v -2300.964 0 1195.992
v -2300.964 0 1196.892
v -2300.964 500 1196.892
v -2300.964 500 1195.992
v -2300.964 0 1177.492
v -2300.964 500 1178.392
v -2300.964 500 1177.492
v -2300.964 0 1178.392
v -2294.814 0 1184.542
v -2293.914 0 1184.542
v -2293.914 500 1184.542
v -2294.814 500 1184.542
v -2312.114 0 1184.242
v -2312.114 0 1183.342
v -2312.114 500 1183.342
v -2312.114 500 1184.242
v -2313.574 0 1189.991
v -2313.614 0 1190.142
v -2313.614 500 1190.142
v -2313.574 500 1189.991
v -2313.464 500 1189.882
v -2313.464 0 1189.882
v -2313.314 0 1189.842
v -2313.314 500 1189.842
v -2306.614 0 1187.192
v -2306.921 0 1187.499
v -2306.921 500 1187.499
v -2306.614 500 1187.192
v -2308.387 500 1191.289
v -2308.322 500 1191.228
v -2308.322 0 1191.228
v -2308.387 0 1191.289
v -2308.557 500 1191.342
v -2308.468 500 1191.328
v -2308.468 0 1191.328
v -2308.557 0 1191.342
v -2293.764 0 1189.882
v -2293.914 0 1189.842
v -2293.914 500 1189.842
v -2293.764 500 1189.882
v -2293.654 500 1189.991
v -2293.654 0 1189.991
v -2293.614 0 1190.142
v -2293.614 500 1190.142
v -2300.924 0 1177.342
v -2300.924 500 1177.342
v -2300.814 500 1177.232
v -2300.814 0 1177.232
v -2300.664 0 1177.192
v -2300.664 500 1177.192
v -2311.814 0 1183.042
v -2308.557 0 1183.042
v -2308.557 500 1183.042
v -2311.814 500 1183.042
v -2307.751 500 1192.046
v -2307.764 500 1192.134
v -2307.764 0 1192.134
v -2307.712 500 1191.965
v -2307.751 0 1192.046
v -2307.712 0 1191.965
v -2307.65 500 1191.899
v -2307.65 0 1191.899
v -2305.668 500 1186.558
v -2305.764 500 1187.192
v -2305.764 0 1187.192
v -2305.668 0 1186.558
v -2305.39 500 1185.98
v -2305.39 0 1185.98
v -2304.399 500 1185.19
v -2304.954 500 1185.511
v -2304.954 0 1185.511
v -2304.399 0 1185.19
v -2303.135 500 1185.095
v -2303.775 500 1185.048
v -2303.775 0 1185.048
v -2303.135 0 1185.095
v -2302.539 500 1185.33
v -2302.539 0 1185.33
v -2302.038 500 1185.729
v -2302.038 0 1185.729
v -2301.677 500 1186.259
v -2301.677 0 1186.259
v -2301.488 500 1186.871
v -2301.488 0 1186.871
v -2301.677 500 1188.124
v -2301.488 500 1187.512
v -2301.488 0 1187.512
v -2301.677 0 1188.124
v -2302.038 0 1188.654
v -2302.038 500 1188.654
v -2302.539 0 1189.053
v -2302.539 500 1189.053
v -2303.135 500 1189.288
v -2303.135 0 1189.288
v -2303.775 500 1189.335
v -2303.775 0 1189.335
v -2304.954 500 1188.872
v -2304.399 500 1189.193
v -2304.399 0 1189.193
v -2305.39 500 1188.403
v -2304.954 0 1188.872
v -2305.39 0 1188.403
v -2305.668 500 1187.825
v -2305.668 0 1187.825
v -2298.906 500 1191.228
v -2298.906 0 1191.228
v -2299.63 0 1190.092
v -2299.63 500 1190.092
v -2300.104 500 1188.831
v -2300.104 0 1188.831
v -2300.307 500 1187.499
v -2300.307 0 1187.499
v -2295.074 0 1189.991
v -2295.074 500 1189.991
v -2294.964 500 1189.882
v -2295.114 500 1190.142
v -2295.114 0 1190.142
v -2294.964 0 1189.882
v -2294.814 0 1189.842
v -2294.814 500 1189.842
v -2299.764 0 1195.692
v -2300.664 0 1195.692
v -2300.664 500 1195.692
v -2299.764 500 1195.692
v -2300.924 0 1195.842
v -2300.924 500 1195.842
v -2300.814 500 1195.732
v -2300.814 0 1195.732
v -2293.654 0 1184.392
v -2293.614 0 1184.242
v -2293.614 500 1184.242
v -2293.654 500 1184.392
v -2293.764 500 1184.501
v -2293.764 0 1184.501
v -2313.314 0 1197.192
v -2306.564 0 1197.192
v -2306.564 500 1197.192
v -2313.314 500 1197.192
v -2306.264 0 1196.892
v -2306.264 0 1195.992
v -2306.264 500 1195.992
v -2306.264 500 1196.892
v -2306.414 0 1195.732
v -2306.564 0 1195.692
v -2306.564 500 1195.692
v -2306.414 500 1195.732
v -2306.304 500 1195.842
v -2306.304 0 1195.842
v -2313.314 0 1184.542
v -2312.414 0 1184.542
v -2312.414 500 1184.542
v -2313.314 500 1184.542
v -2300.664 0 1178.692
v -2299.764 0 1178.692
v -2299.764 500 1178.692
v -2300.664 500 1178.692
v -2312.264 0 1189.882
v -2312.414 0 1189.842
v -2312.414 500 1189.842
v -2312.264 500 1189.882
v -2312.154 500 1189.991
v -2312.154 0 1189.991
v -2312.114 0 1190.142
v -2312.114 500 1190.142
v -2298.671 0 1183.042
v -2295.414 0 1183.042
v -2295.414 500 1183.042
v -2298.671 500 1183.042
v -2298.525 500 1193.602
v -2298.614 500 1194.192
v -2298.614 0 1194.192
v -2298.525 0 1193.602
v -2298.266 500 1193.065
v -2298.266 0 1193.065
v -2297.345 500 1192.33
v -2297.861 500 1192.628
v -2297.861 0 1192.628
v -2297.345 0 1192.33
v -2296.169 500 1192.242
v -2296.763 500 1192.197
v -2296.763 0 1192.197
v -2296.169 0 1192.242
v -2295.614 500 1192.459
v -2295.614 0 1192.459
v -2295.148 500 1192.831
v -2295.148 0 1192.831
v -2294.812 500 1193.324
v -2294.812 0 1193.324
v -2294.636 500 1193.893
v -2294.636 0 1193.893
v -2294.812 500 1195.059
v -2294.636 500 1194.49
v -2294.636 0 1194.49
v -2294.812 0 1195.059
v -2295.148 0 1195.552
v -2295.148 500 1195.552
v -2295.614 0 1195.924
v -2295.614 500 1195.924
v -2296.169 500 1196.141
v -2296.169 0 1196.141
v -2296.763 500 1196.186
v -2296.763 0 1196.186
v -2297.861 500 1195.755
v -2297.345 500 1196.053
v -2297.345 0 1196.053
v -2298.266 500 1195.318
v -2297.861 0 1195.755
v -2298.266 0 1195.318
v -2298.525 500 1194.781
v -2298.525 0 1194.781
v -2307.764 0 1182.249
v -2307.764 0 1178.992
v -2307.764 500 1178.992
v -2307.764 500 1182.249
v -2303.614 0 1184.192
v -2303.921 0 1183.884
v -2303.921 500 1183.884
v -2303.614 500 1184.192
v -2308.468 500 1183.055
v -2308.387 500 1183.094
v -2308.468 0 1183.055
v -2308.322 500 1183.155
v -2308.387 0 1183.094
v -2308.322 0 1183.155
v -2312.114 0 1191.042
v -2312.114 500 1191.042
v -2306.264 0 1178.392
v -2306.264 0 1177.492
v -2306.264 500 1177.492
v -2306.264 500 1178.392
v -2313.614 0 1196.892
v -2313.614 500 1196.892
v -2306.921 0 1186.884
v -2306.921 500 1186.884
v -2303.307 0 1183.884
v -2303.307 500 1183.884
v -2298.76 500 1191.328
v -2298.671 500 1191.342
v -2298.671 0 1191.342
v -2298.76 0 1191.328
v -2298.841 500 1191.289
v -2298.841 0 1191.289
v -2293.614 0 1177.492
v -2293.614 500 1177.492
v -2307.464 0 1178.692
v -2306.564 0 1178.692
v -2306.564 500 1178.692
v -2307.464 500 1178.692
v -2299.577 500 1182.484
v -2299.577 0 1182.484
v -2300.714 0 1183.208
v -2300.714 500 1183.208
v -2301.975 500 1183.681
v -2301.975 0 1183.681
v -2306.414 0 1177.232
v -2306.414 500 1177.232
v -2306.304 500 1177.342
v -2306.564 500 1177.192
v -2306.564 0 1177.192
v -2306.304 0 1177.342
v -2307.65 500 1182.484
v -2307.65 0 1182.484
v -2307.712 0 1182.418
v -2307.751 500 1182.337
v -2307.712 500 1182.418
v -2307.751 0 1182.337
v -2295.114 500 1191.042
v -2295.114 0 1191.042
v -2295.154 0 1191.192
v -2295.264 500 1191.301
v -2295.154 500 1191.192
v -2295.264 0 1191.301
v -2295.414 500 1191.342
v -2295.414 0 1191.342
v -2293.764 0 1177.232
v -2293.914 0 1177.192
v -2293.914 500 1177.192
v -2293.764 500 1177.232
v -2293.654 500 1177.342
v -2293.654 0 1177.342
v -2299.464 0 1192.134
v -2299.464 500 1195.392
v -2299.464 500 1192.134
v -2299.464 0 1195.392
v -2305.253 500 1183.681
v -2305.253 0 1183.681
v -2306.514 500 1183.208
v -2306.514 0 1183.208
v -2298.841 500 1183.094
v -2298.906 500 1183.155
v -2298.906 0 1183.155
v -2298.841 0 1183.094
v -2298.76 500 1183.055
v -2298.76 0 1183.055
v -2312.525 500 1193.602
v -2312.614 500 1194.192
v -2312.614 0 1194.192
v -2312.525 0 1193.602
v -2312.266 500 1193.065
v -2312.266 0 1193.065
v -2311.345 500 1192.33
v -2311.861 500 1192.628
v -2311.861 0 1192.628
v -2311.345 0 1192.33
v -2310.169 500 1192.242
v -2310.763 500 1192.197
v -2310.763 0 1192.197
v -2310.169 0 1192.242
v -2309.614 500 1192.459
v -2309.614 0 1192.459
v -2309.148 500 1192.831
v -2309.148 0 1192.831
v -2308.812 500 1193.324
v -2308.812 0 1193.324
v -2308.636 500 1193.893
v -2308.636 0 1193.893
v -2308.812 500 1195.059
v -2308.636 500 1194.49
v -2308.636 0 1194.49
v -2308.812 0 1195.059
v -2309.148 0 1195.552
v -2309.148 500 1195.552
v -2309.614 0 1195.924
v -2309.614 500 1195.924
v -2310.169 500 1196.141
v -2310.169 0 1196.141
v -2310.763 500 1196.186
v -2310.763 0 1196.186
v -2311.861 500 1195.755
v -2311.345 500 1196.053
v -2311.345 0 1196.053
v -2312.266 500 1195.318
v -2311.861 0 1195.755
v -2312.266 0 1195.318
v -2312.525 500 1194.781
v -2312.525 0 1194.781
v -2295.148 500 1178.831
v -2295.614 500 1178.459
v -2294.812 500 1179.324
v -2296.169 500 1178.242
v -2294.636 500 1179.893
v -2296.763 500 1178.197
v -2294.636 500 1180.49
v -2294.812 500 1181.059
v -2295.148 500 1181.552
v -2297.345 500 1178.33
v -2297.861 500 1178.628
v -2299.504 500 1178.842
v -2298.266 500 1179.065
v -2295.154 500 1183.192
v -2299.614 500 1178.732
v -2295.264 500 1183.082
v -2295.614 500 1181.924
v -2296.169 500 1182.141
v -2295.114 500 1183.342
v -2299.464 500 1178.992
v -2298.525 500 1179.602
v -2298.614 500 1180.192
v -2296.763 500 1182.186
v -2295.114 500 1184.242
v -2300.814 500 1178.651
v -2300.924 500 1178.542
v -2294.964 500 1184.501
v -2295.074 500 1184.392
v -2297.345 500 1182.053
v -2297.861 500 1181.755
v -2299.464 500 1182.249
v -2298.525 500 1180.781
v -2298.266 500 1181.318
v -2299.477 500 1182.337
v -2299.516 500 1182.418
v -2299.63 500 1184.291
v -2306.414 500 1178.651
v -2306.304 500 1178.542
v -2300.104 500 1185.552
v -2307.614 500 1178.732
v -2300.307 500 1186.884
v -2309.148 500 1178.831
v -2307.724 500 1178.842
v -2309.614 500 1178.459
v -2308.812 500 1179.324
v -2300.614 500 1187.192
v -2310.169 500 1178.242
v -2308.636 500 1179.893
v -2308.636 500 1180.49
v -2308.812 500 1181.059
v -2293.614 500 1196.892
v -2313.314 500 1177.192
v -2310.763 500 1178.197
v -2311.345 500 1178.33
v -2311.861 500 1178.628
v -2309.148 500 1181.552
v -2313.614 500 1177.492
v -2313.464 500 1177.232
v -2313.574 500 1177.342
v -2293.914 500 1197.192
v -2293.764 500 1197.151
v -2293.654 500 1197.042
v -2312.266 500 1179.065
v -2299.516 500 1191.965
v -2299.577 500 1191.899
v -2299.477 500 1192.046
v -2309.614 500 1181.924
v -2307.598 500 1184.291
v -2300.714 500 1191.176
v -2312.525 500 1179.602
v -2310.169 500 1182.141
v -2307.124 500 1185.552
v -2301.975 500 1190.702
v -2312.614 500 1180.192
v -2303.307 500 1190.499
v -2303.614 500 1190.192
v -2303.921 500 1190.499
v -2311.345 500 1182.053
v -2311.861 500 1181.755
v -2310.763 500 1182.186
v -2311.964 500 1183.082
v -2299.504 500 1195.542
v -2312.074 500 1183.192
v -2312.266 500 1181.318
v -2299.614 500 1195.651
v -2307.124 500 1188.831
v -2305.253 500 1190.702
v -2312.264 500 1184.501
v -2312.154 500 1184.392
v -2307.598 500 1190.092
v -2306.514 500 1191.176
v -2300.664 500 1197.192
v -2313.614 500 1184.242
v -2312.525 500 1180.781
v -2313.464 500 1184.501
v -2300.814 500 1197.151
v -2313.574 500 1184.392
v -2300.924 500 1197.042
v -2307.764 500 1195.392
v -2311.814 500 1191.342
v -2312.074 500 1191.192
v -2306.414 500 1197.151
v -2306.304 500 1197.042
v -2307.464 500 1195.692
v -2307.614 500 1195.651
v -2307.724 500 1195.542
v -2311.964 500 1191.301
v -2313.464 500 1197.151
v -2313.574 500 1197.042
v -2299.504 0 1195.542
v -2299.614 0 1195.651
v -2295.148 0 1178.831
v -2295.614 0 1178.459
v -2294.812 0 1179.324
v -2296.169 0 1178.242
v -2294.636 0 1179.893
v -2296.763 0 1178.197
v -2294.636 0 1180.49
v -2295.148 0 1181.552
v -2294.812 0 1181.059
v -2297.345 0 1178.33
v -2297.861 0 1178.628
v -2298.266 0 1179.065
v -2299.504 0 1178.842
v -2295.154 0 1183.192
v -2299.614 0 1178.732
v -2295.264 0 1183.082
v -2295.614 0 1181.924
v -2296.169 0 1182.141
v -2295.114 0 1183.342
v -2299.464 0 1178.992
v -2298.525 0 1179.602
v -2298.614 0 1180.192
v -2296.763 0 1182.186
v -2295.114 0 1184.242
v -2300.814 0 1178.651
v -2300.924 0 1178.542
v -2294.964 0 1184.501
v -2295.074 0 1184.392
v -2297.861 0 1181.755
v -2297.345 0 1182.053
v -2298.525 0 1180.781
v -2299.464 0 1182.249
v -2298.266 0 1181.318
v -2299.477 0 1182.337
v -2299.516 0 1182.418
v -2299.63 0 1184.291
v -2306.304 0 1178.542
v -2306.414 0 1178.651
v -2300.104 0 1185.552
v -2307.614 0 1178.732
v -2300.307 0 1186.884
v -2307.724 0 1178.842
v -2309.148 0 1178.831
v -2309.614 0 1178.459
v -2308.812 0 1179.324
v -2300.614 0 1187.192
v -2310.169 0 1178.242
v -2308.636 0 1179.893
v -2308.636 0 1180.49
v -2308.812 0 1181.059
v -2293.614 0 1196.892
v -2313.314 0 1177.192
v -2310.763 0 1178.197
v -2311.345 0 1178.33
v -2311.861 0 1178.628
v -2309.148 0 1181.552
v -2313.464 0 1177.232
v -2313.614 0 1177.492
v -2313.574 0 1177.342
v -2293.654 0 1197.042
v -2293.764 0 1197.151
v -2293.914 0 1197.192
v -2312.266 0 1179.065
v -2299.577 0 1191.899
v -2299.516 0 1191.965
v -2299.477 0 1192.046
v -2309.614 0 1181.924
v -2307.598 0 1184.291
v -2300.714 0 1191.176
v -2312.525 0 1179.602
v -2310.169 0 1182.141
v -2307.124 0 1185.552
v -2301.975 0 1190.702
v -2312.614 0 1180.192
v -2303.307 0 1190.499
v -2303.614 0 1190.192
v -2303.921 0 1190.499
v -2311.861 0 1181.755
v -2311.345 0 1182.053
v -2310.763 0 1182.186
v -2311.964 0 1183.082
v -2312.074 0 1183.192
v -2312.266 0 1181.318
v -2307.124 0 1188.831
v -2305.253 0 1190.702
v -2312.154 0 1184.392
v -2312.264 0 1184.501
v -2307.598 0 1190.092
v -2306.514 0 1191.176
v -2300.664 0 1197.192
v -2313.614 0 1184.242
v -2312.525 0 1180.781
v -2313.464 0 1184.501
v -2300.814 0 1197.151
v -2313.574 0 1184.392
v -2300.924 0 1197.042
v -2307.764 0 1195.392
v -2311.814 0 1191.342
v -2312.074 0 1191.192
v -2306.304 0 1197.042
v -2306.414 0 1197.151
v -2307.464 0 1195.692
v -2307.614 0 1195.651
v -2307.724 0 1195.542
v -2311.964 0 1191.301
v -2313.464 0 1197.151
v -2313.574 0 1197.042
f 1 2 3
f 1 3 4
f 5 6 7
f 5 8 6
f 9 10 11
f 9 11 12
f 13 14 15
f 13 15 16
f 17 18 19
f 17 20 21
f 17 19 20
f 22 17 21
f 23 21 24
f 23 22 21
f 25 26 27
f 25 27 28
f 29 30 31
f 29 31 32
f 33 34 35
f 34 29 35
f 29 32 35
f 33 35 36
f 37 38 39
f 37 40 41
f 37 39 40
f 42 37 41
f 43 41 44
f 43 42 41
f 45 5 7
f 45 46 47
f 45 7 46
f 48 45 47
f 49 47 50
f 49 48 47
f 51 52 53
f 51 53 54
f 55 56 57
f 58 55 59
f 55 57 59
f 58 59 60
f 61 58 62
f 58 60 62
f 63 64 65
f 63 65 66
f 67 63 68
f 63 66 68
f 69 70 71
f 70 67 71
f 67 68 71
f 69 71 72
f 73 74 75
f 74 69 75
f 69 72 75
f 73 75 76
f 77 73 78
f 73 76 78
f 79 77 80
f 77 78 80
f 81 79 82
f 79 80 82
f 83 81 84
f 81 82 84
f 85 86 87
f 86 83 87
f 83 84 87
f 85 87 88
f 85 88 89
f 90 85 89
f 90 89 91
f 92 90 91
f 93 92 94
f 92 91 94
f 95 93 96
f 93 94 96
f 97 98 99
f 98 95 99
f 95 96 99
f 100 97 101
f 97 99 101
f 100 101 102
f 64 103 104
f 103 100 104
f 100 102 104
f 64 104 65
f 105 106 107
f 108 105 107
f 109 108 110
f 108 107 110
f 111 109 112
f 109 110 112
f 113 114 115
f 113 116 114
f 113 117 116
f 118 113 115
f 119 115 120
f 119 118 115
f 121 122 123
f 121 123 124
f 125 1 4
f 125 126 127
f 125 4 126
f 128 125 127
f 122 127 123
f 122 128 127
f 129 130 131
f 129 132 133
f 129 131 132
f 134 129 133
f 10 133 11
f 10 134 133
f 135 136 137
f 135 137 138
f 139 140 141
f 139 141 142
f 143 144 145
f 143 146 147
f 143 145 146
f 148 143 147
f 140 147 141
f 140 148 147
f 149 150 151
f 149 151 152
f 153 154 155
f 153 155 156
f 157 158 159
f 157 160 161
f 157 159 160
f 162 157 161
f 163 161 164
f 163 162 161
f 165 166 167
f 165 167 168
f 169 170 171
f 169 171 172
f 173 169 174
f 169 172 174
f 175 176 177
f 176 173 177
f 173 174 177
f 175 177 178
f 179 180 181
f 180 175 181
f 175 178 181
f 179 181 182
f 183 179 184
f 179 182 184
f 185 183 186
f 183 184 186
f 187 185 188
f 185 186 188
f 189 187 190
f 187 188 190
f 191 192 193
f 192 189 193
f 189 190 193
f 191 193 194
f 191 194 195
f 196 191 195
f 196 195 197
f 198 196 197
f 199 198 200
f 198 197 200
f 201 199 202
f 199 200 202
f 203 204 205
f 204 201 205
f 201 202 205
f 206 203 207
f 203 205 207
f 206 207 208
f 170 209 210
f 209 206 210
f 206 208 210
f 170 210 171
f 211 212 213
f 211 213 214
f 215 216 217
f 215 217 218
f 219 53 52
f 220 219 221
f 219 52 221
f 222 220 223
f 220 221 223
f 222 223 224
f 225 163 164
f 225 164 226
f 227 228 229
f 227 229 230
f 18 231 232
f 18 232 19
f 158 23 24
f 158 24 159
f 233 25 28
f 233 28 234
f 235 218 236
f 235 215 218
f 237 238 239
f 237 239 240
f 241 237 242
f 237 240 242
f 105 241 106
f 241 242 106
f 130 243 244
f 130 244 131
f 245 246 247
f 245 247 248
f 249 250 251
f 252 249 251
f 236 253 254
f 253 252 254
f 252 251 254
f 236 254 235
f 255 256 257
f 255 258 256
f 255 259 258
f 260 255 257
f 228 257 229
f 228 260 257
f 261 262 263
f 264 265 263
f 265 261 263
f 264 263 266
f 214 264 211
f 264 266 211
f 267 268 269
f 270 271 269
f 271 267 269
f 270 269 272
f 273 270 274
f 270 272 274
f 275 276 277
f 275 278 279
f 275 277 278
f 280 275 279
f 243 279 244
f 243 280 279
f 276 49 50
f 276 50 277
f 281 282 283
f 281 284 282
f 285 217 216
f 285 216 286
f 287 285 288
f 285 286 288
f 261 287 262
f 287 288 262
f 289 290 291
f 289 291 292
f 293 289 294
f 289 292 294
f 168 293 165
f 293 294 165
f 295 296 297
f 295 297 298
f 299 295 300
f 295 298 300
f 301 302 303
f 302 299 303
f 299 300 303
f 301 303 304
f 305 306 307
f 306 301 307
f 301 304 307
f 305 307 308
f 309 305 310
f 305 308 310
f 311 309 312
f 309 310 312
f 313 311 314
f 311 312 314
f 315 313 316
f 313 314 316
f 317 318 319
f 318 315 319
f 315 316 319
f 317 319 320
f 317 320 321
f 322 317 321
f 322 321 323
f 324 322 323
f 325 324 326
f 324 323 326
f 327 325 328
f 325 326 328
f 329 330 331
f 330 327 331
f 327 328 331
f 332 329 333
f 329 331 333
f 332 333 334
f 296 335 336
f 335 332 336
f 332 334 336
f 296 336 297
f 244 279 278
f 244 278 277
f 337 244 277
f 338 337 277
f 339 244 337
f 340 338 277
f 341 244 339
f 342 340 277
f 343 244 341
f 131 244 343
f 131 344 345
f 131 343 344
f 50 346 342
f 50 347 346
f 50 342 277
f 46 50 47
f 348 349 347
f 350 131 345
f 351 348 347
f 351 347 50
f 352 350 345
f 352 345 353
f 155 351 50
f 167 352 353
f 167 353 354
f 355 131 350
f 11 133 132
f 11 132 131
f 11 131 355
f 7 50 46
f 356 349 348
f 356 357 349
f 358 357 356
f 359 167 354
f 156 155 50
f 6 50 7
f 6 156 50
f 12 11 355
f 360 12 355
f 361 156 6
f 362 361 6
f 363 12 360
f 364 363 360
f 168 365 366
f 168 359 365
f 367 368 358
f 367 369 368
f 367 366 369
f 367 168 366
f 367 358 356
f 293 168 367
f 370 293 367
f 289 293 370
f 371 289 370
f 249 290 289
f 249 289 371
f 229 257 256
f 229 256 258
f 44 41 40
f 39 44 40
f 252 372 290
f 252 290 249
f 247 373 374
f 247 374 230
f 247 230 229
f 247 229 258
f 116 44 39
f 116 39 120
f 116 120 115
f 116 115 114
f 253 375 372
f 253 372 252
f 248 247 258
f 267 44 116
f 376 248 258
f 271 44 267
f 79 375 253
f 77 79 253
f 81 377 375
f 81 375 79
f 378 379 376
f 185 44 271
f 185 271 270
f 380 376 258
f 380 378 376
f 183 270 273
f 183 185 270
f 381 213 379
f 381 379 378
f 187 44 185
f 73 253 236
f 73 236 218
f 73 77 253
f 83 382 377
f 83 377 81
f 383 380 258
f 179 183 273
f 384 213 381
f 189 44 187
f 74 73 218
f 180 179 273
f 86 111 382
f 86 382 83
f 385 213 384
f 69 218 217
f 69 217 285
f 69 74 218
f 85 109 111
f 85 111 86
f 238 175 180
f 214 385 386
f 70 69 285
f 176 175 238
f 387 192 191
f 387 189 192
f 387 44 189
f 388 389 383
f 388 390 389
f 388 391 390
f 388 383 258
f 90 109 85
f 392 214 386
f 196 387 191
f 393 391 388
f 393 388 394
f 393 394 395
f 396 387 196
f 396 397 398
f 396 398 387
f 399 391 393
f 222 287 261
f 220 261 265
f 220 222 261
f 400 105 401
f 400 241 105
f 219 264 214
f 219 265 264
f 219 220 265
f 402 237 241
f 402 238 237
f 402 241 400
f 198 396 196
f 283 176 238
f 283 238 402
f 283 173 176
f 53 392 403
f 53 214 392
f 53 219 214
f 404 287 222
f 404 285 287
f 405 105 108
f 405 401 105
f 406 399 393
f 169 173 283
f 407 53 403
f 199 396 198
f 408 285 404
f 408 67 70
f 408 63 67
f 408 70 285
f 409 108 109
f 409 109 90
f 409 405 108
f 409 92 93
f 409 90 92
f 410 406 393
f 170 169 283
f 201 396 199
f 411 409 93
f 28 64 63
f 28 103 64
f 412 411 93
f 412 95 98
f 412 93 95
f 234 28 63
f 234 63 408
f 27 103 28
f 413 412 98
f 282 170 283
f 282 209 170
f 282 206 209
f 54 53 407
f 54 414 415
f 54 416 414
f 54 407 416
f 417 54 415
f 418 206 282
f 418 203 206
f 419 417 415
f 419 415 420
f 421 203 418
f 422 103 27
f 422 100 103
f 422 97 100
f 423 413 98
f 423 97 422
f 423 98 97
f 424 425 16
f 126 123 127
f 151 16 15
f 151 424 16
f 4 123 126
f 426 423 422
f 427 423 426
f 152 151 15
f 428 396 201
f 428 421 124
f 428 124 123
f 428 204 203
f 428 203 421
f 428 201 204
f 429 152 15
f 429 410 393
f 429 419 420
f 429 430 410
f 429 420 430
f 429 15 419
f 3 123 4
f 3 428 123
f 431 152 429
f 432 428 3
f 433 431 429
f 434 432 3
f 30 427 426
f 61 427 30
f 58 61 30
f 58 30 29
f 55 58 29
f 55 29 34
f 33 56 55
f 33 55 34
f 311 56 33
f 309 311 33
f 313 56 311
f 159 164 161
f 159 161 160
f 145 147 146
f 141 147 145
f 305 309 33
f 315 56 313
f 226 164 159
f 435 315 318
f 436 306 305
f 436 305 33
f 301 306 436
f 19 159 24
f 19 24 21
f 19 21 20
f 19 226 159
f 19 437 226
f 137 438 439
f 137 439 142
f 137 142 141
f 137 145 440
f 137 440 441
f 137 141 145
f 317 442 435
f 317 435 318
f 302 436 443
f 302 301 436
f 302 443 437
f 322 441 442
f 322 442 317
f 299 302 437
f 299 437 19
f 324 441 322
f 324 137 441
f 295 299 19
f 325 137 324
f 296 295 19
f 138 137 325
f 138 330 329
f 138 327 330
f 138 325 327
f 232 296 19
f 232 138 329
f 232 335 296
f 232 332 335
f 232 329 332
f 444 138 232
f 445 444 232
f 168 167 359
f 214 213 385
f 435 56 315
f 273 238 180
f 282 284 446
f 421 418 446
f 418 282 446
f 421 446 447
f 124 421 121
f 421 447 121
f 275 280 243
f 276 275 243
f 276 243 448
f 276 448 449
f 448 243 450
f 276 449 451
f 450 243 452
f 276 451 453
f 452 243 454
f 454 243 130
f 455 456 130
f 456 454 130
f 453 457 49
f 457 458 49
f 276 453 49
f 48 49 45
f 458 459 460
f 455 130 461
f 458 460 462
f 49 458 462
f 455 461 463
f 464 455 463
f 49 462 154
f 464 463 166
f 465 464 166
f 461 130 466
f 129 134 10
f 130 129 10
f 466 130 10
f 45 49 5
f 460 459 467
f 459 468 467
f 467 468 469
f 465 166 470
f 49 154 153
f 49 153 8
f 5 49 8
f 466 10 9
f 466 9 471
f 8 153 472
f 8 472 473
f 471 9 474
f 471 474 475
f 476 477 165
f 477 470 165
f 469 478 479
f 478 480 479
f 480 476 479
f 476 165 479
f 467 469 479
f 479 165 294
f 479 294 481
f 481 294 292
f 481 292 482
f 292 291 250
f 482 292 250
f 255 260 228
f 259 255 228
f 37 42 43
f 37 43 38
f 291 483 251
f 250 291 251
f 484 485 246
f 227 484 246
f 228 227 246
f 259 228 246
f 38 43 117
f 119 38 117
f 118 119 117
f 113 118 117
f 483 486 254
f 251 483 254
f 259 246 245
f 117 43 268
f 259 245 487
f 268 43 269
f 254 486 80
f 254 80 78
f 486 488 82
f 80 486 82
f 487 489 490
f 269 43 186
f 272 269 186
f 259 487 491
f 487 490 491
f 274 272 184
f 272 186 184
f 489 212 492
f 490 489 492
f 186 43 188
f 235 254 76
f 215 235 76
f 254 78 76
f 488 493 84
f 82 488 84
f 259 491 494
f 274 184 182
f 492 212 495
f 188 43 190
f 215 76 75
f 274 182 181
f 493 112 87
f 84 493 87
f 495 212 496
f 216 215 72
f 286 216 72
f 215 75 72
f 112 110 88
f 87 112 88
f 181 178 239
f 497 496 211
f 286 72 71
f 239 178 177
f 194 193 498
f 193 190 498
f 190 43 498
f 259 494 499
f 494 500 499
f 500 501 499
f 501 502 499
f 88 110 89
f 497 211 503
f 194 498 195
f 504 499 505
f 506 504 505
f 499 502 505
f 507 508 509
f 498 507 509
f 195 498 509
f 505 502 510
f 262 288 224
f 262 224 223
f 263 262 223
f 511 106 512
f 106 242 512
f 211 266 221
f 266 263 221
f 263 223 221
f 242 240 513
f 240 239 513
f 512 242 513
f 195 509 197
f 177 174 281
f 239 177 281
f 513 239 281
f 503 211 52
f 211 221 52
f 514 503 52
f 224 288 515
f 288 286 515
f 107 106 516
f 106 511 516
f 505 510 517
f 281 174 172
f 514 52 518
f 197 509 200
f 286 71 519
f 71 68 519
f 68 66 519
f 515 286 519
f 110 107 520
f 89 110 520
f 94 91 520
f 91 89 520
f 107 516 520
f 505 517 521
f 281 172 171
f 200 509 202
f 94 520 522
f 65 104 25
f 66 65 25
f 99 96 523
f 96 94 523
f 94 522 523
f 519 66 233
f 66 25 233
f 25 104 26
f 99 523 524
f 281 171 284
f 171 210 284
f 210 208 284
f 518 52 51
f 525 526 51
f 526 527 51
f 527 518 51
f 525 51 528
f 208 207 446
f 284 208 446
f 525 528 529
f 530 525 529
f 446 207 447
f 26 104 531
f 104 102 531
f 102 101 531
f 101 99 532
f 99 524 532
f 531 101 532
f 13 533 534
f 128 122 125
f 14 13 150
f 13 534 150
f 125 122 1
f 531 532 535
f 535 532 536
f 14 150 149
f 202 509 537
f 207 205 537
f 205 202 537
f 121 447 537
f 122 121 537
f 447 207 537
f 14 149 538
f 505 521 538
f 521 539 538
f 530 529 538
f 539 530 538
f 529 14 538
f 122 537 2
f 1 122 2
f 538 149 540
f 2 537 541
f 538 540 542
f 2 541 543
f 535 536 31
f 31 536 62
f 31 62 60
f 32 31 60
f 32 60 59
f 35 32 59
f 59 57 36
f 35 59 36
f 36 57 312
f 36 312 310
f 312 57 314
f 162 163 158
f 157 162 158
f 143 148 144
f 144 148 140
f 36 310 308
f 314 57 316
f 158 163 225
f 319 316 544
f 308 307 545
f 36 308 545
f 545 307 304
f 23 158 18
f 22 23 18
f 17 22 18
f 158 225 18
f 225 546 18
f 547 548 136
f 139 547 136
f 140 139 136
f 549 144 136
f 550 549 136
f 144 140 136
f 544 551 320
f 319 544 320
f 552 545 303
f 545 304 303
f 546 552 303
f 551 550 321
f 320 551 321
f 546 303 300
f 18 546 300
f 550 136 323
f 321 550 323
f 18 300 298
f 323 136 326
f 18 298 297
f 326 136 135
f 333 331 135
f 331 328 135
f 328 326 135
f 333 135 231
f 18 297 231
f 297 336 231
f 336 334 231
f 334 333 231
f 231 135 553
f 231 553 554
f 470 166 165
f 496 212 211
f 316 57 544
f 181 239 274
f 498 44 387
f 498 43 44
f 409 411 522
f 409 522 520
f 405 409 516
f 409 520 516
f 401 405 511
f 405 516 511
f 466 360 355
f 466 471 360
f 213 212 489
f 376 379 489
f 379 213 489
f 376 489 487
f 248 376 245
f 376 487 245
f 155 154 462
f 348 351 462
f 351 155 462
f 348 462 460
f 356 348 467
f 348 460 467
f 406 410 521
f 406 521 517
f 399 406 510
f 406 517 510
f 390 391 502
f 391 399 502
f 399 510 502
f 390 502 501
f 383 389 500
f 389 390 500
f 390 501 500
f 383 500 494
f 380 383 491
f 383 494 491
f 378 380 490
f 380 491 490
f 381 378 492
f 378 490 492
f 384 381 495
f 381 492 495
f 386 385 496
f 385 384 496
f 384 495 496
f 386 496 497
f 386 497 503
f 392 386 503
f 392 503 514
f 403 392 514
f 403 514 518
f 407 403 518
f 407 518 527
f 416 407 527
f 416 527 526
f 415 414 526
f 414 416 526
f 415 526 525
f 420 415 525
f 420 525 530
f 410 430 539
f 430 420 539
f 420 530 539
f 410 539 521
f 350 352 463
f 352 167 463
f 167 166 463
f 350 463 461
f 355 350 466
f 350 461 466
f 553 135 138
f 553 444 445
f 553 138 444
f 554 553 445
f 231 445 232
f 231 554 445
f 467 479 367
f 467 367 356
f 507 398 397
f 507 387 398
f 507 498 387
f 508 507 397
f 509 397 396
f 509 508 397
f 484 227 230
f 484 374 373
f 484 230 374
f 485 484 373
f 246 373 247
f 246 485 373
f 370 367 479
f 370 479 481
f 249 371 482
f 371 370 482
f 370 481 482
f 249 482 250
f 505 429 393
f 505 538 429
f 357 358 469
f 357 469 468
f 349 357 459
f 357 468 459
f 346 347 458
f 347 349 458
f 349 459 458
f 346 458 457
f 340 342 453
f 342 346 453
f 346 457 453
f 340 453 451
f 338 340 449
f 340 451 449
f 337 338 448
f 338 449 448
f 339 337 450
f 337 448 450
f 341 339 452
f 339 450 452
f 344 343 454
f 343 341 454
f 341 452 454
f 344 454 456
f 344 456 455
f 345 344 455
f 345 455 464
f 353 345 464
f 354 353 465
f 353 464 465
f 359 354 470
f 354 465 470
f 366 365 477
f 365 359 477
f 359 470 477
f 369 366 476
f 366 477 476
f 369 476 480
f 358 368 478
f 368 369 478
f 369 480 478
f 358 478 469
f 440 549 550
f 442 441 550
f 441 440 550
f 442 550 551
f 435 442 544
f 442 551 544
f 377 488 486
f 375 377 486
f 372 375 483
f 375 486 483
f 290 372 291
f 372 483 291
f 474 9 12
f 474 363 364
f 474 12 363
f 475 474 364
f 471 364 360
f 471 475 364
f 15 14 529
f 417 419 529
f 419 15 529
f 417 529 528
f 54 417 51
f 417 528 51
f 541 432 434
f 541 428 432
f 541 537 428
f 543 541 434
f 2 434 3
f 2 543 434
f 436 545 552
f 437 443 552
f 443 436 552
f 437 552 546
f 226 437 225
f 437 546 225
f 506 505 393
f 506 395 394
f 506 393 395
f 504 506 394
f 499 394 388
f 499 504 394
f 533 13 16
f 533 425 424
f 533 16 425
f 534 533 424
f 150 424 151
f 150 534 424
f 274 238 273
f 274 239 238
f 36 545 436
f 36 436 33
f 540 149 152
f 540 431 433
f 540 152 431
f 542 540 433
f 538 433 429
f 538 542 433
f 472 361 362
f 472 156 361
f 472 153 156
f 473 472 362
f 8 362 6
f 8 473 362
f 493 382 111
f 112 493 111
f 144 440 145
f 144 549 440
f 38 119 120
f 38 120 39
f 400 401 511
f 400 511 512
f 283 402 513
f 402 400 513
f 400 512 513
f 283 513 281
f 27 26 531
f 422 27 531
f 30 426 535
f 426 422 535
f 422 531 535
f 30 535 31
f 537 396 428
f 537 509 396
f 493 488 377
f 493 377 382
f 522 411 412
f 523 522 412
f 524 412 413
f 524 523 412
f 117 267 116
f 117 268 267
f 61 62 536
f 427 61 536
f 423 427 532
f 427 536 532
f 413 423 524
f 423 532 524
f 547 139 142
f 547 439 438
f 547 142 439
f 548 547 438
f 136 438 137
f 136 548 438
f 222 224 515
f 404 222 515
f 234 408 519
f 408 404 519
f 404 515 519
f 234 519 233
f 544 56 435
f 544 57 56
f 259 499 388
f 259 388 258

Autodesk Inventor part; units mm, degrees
ref_plane "YZ Plane" through (0, 0, 0) normal (1, 0, 0) x (0, 1, 0)
ref_plane "XZ Plane" through (0, 0, 0) normal (0, 1, 0) x (-1, 0, 0)
ref_plane "XY Plane" through (0, 0, 0) normal (0, 0, 1) x (1, 0, 0)
sketch "2020_Base" plane through (0, 0, 0) normal (0, 1, 0) x (-1, 0, 0)
  line L0 (2307.7639, 1192.1343) -> (2307.7639, 1195.3915) projected
  arc A0 (2307.7639, 1195.3915) -> (2307.4639, 1195.6915) centre (2307.4639, 1195.3915) ccw projected
  line L1 (2307.4639, 1195.6915) -> (2306.5639, 1195.6915) projected
  arc A1 (2306.2639, 1195.9915) -> (2306.5639, 1195.6915) centre (2306.5639, 1195.9915) ccw projected
  line L2 (2306.2639, 1195.9915) -> (2306.2639, 1196.8915) projected
  arc A2 (2306.5639, 1197.1915) -> (2306.2639, 1196.8915) centre (2306.5639, 1196.8915) ccw projected
  line L3 (2306.5639, 1197.1915) -> (2313.3139, 1197.1915) projected
  arc A3 (2313.6139, 1196.8915) -> (2313.3139, 1197.1915) centre (2313.3139, 1196.8915) ccw projected
  line L4 (2313.6139, 1196.8915) -> (2313.6139, 1190.1415) projected
  arc A4 (2313.3139, 1189.8415) -> (2313.6139, 1190.1415) centre (2313.3139, 1190.1415) ccw projected
  line L5 (2313.3139, 1189.8415) -> (2312.4139, 1189.8415) projected
  arc A5 (2312.1139, 1190.1415) -> (2312.4139, 1189.8415) centre (2312.4139, 1190.1415) ccw projected
  line L6 (2312.1139, 1190.1415) -> (2312.1139, 1191.0415) projected
  arc A6 (2312.1139, 1191.0415) -> (2311.8139, 1191.3415) centre (2311.8139, 1191.0415) ccw projected
  line L7 (2311.8139, 1191.3415) -> (2308.5567, 1191.3415) projected
  arc A7 (2308.5567, 1191.3415) -> (2308.3217, 1191.2281) centre (2308.5567, 1191.0415) ccw projected
  arc A8 (2308.3217, 1191.2281) -> (2306.9212, 1187.4988) centre (2313.4048, 1187.1915) ccw projected
  line L8 (2306.9212, 1187.4988) -> (2306.6139, 1187.1915) projected
  line L9 (2306.6139, 1187.1915) -> (2306.9212, 1186.8843) projected
  arc A9 (2306.9212, 1186.8843) -> (2308.3217, 1183.155) centre (2313.4048, 1187.1915) ccw projected
  arc A10 (2308.3217, 1183.155) -> (2308.5567, 1183.0415) centre (2308.5567, 1183.3415) ccw projected
  line L10 (2308.5567, 1183.0415) -> (2311.8139, 1183.0415) projected
  arc A11 (2311.8139, 1183.0415) -> (2312.1139, 1183.3415) centre (2311.8139, 1183.3415) ccw projected
  line L11 (2312.1139, 1183.3415) -> (2312.1139, 1184.2415) projected
  arc A12 (2312.4139, 1184.5415) -> (2312.1139, 1184.2415) centre (2312.4139, 1184.2415) ccw projected
  line L12 (2312.4139, 1184.5415) -> (2313.3139, 1184.5415) projected
  arc A13 (2313.6139, 1184.2415) -> (2313.3139, 1184.5415) centre (2313.3139, 1184.2415) ccw projected
  line L13 (2313.6139, 1184.2415) -> (2313.6139, 1177.4915) projected
  arc A14 (2313.3139, 1177.1915) -> (2313.6139, 1177.4915) centre (2313.3139, 1177.4915) ccw projected
  line L14 (2313.3139, 1177.1915) -> (2306.5639, 1177.1915) projected
  arc A15 (2306.2639, 1177.4915) -> (2306.5639, 1177.1915) centre (2306.5639, 1177.4915) ccw projected
  line L15 (2306.2639, 1177.4915) -> (2306.2639, 1178.3915) projected
  arc A16 (2306.5639, 1178.6915) -> (2306.2639, 1178.3915) centre (2306.5639, 1178.3915) ccw projected
  line L16 (2306.5639, 1178.6915) -> (2307.4639, 1178.6915) projected
  arc A17 (2307.4639, 1178.6915) -> (2307.7639, 1178.9915) centre (2307.4639, 1178.9915) ccw projected
  line L17 (2307.7639, 1178.9915) -> (2307.7639, 1182.2488) projected
  arc A18 (2307.7639, 1182.2488) -> (2307.6505, 1182.4837) centre (2307.4639, 1182.2488) ccw projected
  arc A19 (2307.6505, 1182.4837) -> (2303.9212, 1183.8843) centre (2303.6139, 1177.4007) ccw projected
  line L18 (2303.9212, 1183.8843) -> (2303.6139, 1184.1915) projected
  line L19 (2303.6139, 1184.1915) -> (2303.3066, 1183.8843) projected
  arc A20 (2303.3066, 1183.8843) -> (2299.5774, 1182.4837) centre (2303.6139, 1177.4007) ccw projected
  arc A21 (2299.5774, 1182.4837) -> (2299.4639, 1182.2488) centre (2299.7639, 1182.2488) ccw projected
  line L20 (2299.4639, 1182.2488) -> (2299.4639, 1178.9915) projected
  arc A22 (2299.4639, 1178.9915) -> (2299.7639, 1178.6915) centre (2299.7639, 1178.9915) ccw projected
  line L21 (2299.7639, 1178.6915) -> (2300.6639, 1178.6915) projected
  arc A23 (2300.9639, 1178.3915) -> (2300.6639, 1178.6915) centre (2300.6639, 1178.3915) ccw projected
  line L22 (2300.9639, 1178.3915) -> (2300.9639, 1177.4915) projected
  arc A24 (2300.6639, 1177.1915) -> (2300.9639, 1177.4915) centre (2300.6639, 1177.4915) ccw projected
  line L23 (2300.6639, 1177.1915) -> (2293.9139, 1177.1915) projected
  arc A25 (2293.6139, 1177.4915) -> (2293.9139, 1177.1915) centre (2293.9139, 1177.4915) ccw projected
  line L24 (2293.6139, 1177.4915) -> (2293.6139, 1184.2415) projected
  arc A26 (2293.9139, 1184.5415) -> (2293.6139, 1184.2415) centre (2293.9139, 1184.2415) ccw projected
  line L25 (2293.9139, 1184.5415) -> (2294.8139, 1184.5415) projected
  arc A27 (2295.1139, 1184.2415) -> (2294.8139, 1184.5415) centre (2294.8139, 1184.2415) ccw projected
  line L26 (2295.1139, 1184.2415) -> (2295.1139, 1183.3415) projected
  arc A28 (2295.1139, 1183.3415) -> (2295.4139, 1183.0415) centre (2295.4139, 1183.3415) ccw projected
  line L27 (2295.4139, 1183.0415) -> (2298.6712, 1183.0415) projected
  arc A29 (2298.6712, 1183.0415) -> (2298.9061, 1183.155) centre (2298.6712, 1183.3415) ccw projected
  arc A30 (2298.9061, 1183.155) -> (2300.3066, 1186.8843) centre (2293.8231, 1187.1915) ccw projected
  line L28 (2300.3066, 1186.8843) -> (2300.6139, 1187.1915) projected
  line L29 (2300.6139, 1187.1915) -> (2300.3066, 1187.4988) projected
  arc A31 (2300.3066, 1187.4988) -> (2298.9061, 1191.2281) centre (2293.8231, 1187.1915) ccw projected
  arc A32 (2298.9061, 1191.2281) -> (2298.6712, 1191.3415) centre (2298.6712, 1191.0415) ccw projected
  line L30 (2298.6712, 1191.3415) -> (2295.4139, 1191.3415) projected
  arc A33 (2295.4139, 1191.3415) -> (2295.1139, 1191.0415) centre (2295.4139, 1191.0415) ccw projected
  line L31 (2295.1139, 1191.0415) -> (2295.1139, 1190.1415) projected
  arc A34 (2294.8139, 1189.8415) -> (2295.1139, 1190.1415) centre (2294.8139, 1190.1415) ccw projected
  line L32 (2294.8139, 1189.8415) -> (2293.9139, 1189.8415) projected
  arc A35 (2293.6139, 1190.1415) -> (2293.9139, 1189.8415) centre (2293.9139, 1190.1415) ccw projected
  line L33 (2293.6139, 1190.1415) -> (2293.6139, 1196.8915) projected
  arc A36 (2293.9139, 1197.1915) -> (2293.6139, 1196.8915) centre (2293.9139, 1196.8915) ccw projected
  line L34 (2293.9139, 1197.1915) -> (2300.6639, 1197.1915) projected
  arc A37 (2300.9639, 1196.8915) -> (2300.6639, 1197.1915) centre (2300.6639, 1196.8915) ccw projected
  line L35 (2300.9639, 1196.8915) -> (2300.9639, 1195.9915) projected
  arc A38 (2300.6639, 1195.6915) -> (2300.9639, 1195.9915) centre (2300.6639, 1195.9915) ccw projected
  line L36 (2300.6639, 1195.6915) -> (2299.7639, 1195.6915) projected
  arc A39 (2299.7639, 1195.6915) -> (2299.4639, 1195.3915) centre (2299.7639, 1195.3915) ccw projected
  line L37 (2299.4639, 1195.3915) -> (2299.4639, 1192.1343) projected
  arc A40 (2299.4639, 1192.1343) -> (2299.5774, 1191.8994) centre (2299.7639, 1192.1343) ccw projected
  arc A41 (2299.5774, 1191.8994) -> (2303.3066, 1190.4988) centre (2303.6139, 1196.9824) ccw projected
  line L38 (2303.3066, 1190.4988) -> (2303.6139, 1190.1915) projected
  line L39 (2303.6139, 1190.1915) -> (2303.9212, 1190.4988) projected
  arc A42 (2303.9212, 1190.4988) -> (2307.6505, 1191.8994) centre (2303.6139, 1196.9824) ccw projected
  arc A43 (2307.6505, 1191.8994) -> (2307.7639, 1192.1343) centre (2307.4639, 1192.1343) ccw projected
  circle A44 centre (2310.6139, 1194.1915) radius 2 projected
  circle A45 centre (2303.6139, 1187.1915) radius 2.15 projected
  circle A46 centre (2296.6139, 1194.1915) radius 2 projected
  circle A47 centre (2296.6139, 1180.1915) radius 2 projected
  circle A48 centre (2310.6139, 1180.1915) radius 2 projected
  point P0 (0, 0)
extrude "500mm 2020" add sketch "2020_Base" along normal blind 500
properties part number "100mm 2020" material "알루미늄 6061"
